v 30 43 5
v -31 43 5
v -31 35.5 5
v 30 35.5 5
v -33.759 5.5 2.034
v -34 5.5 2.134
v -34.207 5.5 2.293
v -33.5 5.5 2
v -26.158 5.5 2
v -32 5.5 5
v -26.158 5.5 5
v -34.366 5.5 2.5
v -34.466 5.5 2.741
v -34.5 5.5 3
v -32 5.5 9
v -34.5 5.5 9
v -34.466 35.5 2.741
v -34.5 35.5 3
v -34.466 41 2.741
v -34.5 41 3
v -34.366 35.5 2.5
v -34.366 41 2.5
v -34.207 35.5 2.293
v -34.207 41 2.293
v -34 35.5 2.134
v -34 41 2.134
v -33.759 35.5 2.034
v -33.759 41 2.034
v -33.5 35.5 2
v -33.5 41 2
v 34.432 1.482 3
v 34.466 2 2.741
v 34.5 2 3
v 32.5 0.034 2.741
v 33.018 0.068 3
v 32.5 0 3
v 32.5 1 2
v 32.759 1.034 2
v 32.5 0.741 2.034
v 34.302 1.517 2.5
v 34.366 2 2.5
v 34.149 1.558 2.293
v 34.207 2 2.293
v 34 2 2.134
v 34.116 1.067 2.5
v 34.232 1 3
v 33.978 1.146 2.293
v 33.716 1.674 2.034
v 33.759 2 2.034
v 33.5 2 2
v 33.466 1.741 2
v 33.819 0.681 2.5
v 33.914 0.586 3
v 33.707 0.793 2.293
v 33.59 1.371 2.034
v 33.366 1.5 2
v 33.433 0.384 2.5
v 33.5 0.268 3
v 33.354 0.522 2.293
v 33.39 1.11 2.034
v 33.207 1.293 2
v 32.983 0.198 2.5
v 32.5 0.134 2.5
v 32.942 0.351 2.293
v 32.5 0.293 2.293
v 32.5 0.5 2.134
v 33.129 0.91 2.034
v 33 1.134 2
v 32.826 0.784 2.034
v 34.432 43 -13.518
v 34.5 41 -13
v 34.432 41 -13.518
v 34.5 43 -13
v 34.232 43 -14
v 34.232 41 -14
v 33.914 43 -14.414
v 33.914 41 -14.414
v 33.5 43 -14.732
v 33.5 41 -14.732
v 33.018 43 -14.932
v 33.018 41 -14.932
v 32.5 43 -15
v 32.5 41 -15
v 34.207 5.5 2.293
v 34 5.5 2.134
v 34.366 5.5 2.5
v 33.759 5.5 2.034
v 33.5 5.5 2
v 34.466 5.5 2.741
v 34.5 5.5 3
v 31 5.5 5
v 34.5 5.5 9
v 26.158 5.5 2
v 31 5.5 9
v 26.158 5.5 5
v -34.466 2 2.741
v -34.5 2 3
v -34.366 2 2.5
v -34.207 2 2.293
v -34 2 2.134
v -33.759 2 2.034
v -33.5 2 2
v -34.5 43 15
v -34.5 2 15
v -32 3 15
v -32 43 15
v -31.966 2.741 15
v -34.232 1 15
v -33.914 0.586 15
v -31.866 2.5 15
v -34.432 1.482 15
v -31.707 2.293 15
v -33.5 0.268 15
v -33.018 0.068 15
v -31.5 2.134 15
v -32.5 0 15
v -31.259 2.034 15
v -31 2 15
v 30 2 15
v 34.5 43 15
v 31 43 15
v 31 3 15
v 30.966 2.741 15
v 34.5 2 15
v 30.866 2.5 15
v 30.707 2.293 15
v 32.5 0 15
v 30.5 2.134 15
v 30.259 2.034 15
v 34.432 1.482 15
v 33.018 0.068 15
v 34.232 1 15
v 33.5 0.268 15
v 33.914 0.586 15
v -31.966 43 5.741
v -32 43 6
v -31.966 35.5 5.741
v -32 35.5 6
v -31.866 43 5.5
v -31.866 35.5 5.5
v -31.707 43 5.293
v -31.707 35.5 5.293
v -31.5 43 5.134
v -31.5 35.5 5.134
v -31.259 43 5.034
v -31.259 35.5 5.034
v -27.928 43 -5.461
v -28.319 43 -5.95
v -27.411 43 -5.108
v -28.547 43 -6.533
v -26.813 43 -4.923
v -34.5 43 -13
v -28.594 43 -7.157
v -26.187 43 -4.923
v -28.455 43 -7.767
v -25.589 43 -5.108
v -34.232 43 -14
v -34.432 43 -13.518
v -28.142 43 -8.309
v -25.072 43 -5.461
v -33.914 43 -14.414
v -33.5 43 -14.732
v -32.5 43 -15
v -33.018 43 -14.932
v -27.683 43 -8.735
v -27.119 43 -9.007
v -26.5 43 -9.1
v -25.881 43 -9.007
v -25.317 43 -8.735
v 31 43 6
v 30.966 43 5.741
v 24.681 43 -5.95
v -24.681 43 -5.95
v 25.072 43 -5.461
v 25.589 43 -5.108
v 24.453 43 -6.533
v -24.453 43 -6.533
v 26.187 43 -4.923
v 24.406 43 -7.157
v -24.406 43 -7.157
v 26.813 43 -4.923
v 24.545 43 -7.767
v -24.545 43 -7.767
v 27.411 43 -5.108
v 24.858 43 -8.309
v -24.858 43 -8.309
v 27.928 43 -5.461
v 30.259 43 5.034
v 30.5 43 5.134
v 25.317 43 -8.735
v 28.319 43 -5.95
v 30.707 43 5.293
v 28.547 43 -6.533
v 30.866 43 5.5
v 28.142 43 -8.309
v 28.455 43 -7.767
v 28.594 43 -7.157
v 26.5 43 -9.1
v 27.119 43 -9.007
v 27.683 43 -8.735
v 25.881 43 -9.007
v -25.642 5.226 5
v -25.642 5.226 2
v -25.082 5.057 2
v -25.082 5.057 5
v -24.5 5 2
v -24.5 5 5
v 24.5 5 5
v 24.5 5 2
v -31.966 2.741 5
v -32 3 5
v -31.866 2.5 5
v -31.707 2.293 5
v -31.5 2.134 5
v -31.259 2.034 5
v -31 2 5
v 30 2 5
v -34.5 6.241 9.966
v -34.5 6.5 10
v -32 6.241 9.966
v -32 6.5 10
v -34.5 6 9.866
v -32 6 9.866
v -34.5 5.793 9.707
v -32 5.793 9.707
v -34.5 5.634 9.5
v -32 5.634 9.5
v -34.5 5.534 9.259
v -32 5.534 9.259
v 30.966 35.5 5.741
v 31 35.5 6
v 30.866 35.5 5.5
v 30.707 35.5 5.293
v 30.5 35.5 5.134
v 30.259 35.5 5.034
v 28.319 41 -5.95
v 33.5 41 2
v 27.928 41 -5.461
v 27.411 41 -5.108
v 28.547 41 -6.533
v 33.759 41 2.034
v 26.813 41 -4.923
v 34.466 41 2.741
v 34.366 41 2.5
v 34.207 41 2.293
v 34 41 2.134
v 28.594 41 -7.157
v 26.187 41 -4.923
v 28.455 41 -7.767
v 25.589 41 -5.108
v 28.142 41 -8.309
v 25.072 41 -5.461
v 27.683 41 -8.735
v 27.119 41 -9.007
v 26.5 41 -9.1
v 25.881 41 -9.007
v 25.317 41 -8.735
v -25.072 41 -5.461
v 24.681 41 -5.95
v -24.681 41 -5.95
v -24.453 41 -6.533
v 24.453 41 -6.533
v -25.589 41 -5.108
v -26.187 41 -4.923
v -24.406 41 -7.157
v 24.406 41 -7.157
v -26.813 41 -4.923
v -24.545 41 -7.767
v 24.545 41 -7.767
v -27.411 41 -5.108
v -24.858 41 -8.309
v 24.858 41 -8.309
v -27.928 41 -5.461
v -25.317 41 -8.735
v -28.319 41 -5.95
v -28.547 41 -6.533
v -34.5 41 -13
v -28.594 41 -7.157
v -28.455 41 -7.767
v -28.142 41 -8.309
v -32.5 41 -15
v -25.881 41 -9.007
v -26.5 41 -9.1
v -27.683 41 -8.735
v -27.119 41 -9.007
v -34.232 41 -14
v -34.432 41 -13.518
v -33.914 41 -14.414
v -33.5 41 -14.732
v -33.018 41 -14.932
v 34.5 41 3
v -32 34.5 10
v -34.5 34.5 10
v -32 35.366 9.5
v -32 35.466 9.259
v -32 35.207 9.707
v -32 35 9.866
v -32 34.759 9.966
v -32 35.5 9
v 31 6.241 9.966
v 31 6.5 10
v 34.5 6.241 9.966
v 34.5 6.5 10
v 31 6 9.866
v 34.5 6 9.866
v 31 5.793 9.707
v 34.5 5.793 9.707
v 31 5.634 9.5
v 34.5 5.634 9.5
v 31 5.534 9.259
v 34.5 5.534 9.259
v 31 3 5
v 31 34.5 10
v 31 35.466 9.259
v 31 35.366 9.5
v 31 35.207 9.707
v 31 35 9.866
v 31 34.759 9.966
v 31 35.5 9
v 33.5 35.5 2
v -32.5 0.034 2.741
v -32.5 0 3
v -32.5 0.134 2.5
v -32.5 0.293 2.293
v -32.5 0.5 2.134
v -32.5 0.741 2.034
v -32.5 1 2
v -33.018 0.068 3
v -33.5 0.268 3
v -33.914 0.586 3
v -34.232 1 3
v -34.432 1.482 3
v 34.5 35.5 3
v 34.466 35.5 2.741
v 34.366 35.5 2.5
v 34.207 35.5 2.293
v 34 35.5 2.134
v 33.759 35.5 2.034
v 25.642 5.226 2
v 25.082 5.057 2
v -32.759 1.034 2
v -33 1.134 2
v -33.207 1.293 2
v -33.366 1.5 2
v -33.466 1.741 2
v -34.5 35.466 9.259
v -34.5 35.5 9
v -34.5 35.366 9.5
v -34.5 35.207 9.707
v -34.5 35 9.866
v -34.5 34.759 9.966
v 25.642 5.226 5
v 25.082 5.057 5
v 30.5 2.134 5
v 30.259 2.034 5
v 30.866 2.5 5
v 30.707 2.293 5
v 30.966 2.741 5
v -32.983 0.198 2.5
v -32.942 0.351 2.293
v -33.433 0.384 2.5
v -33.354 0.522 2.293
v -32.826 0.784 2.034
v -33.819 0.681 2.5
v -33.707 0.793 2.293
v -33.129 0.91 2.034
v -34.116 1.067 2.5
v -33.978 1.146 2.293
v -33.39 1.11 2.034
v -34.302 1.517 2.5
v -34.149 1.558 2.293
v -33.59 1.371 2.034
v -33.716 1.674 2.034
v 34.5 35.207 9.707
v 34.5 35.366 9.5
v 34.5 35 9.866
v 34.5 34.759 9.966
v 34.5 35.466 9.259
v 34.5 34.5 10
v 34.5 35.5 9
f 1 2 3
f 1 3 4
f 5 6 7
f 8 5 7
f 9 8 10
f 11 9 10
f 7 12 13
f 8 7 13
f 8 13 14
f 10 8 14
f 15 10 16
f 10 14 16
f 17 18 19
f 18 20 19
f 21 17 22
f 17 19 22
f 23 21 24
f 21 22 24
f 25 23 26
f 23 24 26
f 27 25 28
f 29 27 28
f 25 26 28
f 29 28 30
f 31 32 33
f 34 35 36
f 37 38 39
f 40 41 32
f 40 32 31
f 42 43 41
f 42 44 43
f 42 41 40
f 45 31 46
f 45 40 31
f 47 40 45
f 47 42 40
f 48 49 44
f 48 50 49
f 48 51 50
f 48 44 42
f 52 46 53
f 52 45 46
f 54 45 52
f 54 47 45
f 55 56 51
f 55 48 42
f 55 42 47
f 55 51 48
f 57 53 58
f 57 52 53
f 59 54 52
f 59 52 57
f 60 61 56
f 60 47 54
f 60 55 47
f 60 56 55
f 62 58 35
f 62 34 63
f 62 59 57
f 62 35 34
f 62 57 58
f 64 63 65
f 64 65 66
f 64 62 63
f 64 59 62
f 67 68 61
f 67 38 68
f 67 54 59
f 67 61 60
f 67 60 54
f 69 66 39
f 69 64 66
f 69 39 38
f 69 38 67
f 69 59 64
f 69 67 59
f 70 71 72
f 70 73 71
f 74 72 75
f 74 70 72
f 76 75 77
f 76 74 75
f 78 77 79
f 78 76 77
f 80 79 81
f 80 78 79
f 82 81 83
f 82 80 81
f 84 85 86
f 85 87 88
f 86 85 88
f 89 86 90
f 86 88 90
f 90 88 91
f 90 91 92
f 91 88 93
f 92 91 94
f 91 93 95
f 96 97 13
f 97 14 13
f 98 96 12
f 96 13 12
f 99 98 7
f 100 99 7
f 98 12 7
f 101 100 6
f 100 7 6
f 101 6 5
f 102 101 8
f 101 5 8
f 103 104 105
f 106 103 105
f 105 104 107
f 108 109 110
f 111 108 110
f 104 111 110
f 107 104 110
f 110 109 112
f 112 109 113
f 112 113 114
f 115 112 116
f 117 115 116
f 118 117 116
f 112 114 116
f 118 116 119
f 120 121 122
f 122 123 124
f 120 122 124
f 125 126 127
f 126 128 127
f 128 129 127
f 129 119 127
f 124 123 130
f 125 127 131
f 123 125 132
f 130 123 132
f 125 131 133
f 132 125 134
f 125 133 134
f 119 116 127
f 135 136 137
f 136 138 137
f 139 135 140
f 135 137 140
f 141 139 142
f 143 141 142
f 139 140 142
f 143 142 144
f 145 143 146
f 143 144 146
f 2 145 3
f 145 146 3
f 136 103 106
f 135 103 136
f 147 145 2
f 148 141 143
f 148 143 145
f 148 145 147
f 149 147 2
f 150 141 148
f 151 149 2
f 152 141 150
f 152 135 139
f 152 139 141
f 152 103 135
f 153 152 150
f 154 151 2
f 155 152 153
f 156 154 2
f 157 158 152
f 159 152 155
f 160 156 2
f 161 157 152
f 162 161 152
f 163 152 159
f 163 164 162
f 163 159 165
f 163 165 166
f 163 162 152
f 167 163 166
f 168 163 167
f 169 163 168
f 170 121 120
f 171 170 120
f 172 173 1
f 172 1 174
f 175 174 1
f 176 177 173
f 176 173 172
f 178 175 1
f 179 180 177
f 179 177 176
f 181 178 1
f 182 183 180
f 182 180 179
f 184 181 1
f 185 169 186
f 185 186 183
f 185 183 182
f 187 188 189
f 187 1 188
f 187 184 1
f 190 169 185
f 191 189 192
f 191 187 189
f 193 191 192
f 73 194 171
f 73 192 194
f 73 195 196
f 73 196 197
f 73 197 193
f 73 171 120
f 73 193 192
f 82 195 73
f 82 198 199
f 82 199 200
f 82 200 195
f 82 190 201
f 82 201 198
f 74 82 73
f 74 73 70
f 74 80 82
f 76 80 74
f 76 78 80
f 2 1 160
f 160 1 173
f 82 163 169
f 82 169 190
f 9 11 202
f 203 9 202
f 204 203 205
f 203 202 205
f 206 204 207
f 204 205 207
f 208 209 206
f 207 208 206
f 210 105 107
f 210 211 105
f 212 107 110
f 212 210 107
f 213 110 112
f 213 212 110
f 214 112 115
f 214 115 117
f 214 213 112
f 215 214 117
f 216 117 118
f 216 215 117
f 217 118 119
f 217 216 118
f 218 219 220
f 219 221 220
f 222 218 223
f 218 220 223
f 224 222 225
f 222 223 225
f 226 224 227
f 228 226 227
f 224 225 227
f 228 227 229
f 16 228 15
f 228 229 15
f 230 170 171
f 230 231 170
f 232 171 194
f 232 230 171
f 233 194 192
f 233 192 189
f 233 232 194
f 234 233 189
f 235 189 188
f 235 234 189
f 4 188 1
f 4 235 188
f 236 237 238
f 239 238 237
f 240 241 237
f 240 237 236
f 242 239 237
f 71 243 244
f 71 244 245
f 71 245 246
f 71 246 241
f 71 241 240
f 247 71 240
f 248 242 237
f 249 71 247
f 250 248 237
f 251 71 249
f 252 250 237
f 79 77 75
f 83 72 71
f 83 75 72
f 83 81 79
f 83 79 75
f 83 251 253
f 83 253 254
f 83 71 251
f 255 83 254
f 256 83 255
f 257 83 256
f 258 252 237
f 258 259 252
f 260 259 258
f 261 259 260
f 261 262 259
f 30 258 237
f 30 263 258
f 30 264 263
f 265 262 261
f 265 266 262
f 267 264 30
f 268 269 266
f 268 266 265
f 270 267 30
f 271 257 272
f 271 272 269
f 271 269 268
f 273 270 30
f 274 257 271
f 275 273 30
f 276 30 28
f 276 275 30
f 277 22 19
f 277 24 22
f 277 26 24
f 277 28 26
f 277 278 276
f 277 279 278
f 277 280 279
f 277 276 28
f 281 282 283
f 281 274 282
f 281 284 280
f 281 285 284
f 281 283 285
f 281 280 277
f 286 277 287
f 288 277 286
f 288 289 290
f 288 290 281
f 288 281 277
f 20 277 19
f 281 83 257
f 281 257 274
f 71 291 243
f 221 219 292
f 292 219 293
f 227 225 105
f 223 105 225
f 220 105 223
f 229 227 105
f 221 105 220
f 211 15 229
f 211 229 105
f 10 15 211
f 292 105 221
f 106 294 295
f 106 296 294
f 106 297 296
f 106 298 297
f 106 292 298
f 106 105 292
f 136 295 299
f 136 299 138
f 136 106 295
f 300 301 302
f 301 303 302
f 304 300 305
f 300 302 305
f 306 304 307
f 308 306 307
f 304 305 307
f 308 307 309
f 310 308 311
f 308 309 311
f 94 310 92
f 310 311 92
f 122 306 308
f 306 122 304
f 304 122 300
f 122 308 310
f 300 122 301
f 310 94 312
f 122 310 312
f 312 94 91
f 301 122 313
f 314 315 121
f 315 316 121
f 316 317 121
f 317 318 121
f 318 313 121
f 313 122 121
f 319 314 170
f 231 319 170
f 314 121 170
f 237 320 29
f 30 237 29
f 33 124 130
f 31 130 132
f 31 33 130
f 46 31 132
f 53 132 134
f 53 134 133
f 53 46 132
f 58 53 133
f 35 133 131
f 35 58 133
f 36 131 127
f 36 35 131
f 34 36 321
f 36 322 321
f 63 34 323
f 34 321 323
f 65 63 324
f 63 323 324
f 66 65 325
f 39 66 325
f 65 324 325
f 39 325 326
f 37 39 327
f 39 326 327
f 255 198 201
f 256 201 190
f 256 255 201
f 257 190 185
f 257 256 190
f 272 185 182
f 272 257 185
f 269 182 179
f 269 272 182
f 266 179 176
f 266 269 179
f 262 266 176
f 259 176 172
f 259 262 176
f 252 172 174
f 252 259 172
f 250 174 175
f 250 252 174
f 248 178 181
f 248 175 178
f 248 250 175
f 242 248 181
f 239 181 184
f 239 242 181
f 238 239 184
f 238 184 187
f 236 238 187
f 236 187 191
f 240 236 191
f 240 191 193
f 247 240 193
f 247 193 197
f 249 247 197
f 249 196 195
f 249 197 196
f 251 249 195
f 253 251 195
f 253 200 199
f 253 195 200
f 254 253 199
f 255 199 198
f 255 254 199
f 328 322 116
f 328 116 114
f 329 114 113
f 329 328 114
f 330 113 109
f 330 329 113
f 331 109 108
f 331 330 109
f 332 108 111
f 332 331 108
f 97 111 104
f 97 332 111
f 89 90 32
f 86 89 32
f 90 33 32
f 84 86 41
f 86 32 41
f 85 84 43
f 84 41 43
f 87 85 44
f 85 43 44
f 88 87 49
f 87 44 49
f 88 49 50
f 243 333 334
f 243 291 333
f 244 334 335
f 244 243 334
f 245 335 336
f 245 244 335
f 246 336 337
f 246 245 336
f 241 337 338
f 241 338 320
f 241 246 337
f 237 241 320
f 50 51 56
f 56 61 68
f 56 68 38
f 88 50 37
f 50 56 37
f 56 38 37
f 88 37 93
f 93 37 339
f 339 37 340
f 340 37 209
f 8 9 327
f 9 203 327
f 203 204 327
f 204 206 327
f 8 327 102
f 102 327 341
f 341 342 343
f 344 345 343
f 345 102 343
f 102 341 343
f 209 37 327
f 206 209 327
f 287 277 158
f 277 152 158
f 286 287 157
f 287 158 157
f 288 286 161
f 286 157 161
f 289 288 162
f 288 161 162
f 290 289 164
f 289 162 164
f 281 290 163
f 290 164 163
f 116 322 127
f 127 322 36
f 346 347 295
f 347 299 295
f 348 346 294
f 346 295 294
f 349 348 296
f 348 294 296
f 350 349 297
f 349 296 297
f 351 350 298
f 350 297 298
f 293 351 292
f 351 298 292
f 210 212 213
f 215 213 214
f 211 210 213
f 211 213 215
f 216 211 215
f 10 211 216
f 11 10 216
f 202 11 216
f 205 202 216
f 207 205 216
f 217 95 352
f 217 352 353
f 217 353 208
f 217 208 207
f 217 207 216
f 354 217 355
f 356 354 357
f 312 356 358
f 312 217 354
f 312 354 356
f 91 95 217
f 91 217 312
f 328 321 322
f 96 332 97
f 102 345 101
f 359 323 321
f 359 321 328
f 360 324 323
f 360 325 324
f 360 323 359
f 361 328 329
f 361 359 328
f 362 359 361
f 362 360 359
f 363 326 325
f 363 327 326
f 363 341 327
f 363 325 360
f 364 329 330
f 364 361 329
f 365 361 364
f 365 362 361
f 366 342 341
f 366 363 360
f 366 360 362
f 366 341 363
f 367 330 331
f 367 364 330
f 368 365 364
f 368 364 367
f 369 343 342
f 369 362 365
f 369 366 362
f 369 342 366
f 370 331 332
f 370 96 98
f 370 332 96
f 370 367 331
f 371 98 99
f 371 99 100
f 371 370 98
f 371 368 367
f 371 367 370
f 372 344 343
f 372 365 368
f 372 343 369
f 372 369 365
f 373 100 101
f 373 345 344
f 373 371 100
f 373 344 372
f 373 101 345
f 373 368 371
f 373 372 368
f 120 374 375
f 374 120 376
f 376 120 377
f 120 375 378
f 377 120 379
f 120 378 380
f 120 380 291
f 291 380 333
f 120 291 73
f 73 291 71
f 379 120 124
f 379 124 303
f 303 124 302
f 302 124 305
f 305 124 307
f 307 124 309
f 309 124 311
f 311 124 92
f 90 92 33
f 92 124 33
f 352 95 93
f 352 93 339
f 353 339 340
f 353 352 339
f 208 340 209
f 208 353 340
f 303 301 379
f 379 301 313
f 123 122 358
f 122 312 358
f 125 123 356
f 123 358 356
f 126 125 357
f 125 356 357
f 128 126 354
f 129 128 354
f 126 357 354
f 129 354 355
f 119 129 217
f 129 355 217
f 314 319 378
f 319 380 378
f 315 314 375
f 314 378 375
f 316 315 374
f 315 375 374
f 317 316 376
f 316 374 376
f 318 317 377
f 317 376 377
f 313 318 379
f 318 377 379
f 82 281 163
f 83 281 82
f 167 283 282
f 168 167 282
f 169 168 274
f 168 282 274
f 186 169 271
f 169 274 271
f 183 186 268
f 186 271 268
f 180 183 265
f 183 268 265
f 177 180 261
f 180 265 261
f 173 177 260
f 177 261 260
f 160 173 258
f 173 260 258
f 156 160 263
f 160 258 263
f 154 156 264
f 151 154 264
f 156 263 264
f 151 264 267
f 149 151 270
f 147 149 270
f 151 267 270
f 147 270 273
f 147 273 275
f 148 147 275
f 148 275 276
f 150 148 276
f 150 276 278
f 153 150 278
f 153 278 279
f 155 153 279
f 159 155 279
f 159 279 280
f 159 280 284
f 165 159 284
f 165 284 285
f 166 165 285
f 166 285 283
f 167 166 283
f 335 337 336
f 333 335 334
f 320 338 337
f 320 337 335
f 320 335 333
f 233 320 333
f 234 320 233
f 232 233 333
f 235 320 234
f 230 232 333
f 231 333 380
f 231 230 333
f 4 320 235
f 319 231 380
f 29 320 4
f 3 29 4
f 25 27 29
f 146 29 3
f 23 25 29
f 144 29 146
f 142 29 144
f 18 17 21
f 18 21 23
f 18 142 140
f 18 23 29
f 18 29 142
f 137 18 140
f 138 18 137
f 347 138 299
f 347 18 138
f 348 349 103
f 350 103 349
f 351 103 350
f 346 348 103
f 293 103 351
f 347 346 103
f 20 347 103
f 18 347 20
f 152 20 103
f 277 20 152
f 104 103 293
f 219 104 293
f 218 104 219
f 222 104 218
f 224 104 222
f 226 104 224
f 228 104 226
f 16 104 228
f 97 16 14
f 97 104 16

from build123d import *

# Parameters (mm, degrees)
SKETCH_1_W          = 69
SKETCH_1_H          = 30
EXTRUDE_1_DEPTH     = 43
SKETCH_3_W          = 63
SKETCH_3_H          = 10
CUT_EXTRUDE_2_DEPTH = 41
SKETCH_4_W          = 69
SKETCH_4_H          = 17
CUT_EXTRUDE_3_DEPTH = 41
SKETCH_5_R          = 2.1
CUT_EXTRUDE_4_DEPTH = 56.643957444
SKETCH_9_W          = 55
SKETCH_9_H          = 30
CUT_EXTRUDE_5_DEPTH = 58.690987164
FILLET_1_R          = 3
FILLET_2_R          = 2
FILLET_3_R          = 1
SKETCH_10_W         = 8
SKETCH_10_H         = 30
CUT_EXTRUDE_6_DEPTH = 83.674058809
FILLET_4_R          = 1
FILLET_5_R          = 1


with BuildPart() as part:
    # 草图1 → 凸台-拉伸1 (new body)
    with BuildSketch(Plane(origin=(0, 0, 0), x_dir=(1, 0, 0), z_dir=(0, 1, 0))):
        Rectangle(SKETCH_1_W, SKETCH_1_H)
    extrude(amount=EXTRUDE_1_DEPTH)

    # 草图3 → 切除-拉伸2 (cut)
    with BuildSketch(Plane(origin=(0, 43, 0), x_dir=(1, 0, 0), z_dir=(0, 1, 0))):
        with Locations((-0.5, -10)):
            Rectangle(SKETCH_3_W, SKETCH_3_H)
    extrude(amount=-CUT_EXTRUDE_2_DEPTH, mode=Mode.SUBTRACT)

    # 草图4 → 切除-拉伸3 (cut)
    with BuildSketch(Plane(origin=(0, 0, 0), x_dir=(-1, 0, 0), z_dir=(0, -1, 0))):
        with Locations((0, 6.5)):
            Rectangle(SKETCH_4_W, SKETCH_4_H)
    extrude(amount=-CUT_EXTRUDE_3_DEPTH, mode=Mode.SUBTRACT)

    # 草图5 → 切除-拉伸4 (cut, through all)
    with BuildSketch(Plane(origin=(0, 41, 0), x_dir=(-1, 0, 0), z_dir=(0, -1, 0))):
        with Locations(Location((26.5, 7, 0), (0, 0, 90))):
            Circle(SKETCH_5_R)
    cut_extrude_4 = extrude(amount=-CUT_EXTRUDE_4_DEPTH, mode=Mode.SUBTRACT)

    # 镜向1: 切除-拉伸4 across plane
    add(cut_extrude_4.mirror(Plane.ZY), mode=Mode.SUBTRACT)

    # 草图9 → 切除-拉伸5 (cut, through all)
    with BuildSketch(Plane(origin=(0, 0, 2), x_dir=(-1, 0, 0), z_dir=(0, 0, -1))):
        with Locations((0, 20)):
            Rectangle(SKETCH_9_W, SKETCH_9_H)
    extrude(amount=-CUT_EXTRUDE_5_DEPTH, mode=Mode.SUBTRACT)

    # 圆角1
    fillet_1_edges = [part.edges().sort_by_distance(p)[0] for p in [
        (-27.5, 35, 3.5),
        (-27.5, 5, 3.5),
        (27.5, 5, 3.5),
        (27.5, 35, 3.5),
    ]]
    fillet(fillet_1_edges, radius=FILLET_1_R)

    # 圆角2
    fillet_2_edges = [part.edges().sort_by_distance(p)[0] for p in [
        (-34.5, 0, 8.5),
        (34.5, 0, 8.5),
        (-34.5, 42, -15),
        (34.5, 42, -15),
    ]]
    fillet(fillet_2_edges, radius=FILLET_2_R)

    # 圆角3
    fillet_3_edges = [part.edges().sort_by_distance(p)[0] for p in [
        (-32, 2, 10),
        (31, 2, 10),
    ]]
    fillet(fillet_3_edges, radius=FILLET_3_R)

    # 草图10 → 切除-拉伸6 (cut, through all)
    with BuildSketch(Plane.ZY.offset(34.5)):
        with Locations((6, 20.5)):
            Rectangle(SKETCH_10_W, SKETCH_10_H)
    extrude(amount=-CUT_EXTRUDE_6_DEPTH, mode=Mode.SUBTRACT)

    # 圆角4
    fillet_4_edges = [part.edges().sort_by_distance(p)[0] for p in [
        (31, 39.25, 5),
        (-32, 39.25, 5),
        (-33.25, 35.5, 10),
        (32.75, 35.5, 10),
        (32.75, 5.5, 10),
        (-33.25, 5.5, 10),
    ]]
    fillet(fillet_4_edges, radius=FILLET_4_R)

    # 圆角5
    fillet_5_edges = [part.edges().sort_by_distance(p)[0] for p in [
        (0, 0, 2),
        (33.914213562, 0.585786438, 2),
        (-33.914213562, 0.585786438, 2),
        (-34.5, 3.75, 2),
        (34.5, 3.75, 2),
        (-34.5, 38.25, 2),
        (34.5, 38.25, 2),
    ]]
    fillet(fillet_5_edges, radius=FILLET_5_R)


solid = part.part
